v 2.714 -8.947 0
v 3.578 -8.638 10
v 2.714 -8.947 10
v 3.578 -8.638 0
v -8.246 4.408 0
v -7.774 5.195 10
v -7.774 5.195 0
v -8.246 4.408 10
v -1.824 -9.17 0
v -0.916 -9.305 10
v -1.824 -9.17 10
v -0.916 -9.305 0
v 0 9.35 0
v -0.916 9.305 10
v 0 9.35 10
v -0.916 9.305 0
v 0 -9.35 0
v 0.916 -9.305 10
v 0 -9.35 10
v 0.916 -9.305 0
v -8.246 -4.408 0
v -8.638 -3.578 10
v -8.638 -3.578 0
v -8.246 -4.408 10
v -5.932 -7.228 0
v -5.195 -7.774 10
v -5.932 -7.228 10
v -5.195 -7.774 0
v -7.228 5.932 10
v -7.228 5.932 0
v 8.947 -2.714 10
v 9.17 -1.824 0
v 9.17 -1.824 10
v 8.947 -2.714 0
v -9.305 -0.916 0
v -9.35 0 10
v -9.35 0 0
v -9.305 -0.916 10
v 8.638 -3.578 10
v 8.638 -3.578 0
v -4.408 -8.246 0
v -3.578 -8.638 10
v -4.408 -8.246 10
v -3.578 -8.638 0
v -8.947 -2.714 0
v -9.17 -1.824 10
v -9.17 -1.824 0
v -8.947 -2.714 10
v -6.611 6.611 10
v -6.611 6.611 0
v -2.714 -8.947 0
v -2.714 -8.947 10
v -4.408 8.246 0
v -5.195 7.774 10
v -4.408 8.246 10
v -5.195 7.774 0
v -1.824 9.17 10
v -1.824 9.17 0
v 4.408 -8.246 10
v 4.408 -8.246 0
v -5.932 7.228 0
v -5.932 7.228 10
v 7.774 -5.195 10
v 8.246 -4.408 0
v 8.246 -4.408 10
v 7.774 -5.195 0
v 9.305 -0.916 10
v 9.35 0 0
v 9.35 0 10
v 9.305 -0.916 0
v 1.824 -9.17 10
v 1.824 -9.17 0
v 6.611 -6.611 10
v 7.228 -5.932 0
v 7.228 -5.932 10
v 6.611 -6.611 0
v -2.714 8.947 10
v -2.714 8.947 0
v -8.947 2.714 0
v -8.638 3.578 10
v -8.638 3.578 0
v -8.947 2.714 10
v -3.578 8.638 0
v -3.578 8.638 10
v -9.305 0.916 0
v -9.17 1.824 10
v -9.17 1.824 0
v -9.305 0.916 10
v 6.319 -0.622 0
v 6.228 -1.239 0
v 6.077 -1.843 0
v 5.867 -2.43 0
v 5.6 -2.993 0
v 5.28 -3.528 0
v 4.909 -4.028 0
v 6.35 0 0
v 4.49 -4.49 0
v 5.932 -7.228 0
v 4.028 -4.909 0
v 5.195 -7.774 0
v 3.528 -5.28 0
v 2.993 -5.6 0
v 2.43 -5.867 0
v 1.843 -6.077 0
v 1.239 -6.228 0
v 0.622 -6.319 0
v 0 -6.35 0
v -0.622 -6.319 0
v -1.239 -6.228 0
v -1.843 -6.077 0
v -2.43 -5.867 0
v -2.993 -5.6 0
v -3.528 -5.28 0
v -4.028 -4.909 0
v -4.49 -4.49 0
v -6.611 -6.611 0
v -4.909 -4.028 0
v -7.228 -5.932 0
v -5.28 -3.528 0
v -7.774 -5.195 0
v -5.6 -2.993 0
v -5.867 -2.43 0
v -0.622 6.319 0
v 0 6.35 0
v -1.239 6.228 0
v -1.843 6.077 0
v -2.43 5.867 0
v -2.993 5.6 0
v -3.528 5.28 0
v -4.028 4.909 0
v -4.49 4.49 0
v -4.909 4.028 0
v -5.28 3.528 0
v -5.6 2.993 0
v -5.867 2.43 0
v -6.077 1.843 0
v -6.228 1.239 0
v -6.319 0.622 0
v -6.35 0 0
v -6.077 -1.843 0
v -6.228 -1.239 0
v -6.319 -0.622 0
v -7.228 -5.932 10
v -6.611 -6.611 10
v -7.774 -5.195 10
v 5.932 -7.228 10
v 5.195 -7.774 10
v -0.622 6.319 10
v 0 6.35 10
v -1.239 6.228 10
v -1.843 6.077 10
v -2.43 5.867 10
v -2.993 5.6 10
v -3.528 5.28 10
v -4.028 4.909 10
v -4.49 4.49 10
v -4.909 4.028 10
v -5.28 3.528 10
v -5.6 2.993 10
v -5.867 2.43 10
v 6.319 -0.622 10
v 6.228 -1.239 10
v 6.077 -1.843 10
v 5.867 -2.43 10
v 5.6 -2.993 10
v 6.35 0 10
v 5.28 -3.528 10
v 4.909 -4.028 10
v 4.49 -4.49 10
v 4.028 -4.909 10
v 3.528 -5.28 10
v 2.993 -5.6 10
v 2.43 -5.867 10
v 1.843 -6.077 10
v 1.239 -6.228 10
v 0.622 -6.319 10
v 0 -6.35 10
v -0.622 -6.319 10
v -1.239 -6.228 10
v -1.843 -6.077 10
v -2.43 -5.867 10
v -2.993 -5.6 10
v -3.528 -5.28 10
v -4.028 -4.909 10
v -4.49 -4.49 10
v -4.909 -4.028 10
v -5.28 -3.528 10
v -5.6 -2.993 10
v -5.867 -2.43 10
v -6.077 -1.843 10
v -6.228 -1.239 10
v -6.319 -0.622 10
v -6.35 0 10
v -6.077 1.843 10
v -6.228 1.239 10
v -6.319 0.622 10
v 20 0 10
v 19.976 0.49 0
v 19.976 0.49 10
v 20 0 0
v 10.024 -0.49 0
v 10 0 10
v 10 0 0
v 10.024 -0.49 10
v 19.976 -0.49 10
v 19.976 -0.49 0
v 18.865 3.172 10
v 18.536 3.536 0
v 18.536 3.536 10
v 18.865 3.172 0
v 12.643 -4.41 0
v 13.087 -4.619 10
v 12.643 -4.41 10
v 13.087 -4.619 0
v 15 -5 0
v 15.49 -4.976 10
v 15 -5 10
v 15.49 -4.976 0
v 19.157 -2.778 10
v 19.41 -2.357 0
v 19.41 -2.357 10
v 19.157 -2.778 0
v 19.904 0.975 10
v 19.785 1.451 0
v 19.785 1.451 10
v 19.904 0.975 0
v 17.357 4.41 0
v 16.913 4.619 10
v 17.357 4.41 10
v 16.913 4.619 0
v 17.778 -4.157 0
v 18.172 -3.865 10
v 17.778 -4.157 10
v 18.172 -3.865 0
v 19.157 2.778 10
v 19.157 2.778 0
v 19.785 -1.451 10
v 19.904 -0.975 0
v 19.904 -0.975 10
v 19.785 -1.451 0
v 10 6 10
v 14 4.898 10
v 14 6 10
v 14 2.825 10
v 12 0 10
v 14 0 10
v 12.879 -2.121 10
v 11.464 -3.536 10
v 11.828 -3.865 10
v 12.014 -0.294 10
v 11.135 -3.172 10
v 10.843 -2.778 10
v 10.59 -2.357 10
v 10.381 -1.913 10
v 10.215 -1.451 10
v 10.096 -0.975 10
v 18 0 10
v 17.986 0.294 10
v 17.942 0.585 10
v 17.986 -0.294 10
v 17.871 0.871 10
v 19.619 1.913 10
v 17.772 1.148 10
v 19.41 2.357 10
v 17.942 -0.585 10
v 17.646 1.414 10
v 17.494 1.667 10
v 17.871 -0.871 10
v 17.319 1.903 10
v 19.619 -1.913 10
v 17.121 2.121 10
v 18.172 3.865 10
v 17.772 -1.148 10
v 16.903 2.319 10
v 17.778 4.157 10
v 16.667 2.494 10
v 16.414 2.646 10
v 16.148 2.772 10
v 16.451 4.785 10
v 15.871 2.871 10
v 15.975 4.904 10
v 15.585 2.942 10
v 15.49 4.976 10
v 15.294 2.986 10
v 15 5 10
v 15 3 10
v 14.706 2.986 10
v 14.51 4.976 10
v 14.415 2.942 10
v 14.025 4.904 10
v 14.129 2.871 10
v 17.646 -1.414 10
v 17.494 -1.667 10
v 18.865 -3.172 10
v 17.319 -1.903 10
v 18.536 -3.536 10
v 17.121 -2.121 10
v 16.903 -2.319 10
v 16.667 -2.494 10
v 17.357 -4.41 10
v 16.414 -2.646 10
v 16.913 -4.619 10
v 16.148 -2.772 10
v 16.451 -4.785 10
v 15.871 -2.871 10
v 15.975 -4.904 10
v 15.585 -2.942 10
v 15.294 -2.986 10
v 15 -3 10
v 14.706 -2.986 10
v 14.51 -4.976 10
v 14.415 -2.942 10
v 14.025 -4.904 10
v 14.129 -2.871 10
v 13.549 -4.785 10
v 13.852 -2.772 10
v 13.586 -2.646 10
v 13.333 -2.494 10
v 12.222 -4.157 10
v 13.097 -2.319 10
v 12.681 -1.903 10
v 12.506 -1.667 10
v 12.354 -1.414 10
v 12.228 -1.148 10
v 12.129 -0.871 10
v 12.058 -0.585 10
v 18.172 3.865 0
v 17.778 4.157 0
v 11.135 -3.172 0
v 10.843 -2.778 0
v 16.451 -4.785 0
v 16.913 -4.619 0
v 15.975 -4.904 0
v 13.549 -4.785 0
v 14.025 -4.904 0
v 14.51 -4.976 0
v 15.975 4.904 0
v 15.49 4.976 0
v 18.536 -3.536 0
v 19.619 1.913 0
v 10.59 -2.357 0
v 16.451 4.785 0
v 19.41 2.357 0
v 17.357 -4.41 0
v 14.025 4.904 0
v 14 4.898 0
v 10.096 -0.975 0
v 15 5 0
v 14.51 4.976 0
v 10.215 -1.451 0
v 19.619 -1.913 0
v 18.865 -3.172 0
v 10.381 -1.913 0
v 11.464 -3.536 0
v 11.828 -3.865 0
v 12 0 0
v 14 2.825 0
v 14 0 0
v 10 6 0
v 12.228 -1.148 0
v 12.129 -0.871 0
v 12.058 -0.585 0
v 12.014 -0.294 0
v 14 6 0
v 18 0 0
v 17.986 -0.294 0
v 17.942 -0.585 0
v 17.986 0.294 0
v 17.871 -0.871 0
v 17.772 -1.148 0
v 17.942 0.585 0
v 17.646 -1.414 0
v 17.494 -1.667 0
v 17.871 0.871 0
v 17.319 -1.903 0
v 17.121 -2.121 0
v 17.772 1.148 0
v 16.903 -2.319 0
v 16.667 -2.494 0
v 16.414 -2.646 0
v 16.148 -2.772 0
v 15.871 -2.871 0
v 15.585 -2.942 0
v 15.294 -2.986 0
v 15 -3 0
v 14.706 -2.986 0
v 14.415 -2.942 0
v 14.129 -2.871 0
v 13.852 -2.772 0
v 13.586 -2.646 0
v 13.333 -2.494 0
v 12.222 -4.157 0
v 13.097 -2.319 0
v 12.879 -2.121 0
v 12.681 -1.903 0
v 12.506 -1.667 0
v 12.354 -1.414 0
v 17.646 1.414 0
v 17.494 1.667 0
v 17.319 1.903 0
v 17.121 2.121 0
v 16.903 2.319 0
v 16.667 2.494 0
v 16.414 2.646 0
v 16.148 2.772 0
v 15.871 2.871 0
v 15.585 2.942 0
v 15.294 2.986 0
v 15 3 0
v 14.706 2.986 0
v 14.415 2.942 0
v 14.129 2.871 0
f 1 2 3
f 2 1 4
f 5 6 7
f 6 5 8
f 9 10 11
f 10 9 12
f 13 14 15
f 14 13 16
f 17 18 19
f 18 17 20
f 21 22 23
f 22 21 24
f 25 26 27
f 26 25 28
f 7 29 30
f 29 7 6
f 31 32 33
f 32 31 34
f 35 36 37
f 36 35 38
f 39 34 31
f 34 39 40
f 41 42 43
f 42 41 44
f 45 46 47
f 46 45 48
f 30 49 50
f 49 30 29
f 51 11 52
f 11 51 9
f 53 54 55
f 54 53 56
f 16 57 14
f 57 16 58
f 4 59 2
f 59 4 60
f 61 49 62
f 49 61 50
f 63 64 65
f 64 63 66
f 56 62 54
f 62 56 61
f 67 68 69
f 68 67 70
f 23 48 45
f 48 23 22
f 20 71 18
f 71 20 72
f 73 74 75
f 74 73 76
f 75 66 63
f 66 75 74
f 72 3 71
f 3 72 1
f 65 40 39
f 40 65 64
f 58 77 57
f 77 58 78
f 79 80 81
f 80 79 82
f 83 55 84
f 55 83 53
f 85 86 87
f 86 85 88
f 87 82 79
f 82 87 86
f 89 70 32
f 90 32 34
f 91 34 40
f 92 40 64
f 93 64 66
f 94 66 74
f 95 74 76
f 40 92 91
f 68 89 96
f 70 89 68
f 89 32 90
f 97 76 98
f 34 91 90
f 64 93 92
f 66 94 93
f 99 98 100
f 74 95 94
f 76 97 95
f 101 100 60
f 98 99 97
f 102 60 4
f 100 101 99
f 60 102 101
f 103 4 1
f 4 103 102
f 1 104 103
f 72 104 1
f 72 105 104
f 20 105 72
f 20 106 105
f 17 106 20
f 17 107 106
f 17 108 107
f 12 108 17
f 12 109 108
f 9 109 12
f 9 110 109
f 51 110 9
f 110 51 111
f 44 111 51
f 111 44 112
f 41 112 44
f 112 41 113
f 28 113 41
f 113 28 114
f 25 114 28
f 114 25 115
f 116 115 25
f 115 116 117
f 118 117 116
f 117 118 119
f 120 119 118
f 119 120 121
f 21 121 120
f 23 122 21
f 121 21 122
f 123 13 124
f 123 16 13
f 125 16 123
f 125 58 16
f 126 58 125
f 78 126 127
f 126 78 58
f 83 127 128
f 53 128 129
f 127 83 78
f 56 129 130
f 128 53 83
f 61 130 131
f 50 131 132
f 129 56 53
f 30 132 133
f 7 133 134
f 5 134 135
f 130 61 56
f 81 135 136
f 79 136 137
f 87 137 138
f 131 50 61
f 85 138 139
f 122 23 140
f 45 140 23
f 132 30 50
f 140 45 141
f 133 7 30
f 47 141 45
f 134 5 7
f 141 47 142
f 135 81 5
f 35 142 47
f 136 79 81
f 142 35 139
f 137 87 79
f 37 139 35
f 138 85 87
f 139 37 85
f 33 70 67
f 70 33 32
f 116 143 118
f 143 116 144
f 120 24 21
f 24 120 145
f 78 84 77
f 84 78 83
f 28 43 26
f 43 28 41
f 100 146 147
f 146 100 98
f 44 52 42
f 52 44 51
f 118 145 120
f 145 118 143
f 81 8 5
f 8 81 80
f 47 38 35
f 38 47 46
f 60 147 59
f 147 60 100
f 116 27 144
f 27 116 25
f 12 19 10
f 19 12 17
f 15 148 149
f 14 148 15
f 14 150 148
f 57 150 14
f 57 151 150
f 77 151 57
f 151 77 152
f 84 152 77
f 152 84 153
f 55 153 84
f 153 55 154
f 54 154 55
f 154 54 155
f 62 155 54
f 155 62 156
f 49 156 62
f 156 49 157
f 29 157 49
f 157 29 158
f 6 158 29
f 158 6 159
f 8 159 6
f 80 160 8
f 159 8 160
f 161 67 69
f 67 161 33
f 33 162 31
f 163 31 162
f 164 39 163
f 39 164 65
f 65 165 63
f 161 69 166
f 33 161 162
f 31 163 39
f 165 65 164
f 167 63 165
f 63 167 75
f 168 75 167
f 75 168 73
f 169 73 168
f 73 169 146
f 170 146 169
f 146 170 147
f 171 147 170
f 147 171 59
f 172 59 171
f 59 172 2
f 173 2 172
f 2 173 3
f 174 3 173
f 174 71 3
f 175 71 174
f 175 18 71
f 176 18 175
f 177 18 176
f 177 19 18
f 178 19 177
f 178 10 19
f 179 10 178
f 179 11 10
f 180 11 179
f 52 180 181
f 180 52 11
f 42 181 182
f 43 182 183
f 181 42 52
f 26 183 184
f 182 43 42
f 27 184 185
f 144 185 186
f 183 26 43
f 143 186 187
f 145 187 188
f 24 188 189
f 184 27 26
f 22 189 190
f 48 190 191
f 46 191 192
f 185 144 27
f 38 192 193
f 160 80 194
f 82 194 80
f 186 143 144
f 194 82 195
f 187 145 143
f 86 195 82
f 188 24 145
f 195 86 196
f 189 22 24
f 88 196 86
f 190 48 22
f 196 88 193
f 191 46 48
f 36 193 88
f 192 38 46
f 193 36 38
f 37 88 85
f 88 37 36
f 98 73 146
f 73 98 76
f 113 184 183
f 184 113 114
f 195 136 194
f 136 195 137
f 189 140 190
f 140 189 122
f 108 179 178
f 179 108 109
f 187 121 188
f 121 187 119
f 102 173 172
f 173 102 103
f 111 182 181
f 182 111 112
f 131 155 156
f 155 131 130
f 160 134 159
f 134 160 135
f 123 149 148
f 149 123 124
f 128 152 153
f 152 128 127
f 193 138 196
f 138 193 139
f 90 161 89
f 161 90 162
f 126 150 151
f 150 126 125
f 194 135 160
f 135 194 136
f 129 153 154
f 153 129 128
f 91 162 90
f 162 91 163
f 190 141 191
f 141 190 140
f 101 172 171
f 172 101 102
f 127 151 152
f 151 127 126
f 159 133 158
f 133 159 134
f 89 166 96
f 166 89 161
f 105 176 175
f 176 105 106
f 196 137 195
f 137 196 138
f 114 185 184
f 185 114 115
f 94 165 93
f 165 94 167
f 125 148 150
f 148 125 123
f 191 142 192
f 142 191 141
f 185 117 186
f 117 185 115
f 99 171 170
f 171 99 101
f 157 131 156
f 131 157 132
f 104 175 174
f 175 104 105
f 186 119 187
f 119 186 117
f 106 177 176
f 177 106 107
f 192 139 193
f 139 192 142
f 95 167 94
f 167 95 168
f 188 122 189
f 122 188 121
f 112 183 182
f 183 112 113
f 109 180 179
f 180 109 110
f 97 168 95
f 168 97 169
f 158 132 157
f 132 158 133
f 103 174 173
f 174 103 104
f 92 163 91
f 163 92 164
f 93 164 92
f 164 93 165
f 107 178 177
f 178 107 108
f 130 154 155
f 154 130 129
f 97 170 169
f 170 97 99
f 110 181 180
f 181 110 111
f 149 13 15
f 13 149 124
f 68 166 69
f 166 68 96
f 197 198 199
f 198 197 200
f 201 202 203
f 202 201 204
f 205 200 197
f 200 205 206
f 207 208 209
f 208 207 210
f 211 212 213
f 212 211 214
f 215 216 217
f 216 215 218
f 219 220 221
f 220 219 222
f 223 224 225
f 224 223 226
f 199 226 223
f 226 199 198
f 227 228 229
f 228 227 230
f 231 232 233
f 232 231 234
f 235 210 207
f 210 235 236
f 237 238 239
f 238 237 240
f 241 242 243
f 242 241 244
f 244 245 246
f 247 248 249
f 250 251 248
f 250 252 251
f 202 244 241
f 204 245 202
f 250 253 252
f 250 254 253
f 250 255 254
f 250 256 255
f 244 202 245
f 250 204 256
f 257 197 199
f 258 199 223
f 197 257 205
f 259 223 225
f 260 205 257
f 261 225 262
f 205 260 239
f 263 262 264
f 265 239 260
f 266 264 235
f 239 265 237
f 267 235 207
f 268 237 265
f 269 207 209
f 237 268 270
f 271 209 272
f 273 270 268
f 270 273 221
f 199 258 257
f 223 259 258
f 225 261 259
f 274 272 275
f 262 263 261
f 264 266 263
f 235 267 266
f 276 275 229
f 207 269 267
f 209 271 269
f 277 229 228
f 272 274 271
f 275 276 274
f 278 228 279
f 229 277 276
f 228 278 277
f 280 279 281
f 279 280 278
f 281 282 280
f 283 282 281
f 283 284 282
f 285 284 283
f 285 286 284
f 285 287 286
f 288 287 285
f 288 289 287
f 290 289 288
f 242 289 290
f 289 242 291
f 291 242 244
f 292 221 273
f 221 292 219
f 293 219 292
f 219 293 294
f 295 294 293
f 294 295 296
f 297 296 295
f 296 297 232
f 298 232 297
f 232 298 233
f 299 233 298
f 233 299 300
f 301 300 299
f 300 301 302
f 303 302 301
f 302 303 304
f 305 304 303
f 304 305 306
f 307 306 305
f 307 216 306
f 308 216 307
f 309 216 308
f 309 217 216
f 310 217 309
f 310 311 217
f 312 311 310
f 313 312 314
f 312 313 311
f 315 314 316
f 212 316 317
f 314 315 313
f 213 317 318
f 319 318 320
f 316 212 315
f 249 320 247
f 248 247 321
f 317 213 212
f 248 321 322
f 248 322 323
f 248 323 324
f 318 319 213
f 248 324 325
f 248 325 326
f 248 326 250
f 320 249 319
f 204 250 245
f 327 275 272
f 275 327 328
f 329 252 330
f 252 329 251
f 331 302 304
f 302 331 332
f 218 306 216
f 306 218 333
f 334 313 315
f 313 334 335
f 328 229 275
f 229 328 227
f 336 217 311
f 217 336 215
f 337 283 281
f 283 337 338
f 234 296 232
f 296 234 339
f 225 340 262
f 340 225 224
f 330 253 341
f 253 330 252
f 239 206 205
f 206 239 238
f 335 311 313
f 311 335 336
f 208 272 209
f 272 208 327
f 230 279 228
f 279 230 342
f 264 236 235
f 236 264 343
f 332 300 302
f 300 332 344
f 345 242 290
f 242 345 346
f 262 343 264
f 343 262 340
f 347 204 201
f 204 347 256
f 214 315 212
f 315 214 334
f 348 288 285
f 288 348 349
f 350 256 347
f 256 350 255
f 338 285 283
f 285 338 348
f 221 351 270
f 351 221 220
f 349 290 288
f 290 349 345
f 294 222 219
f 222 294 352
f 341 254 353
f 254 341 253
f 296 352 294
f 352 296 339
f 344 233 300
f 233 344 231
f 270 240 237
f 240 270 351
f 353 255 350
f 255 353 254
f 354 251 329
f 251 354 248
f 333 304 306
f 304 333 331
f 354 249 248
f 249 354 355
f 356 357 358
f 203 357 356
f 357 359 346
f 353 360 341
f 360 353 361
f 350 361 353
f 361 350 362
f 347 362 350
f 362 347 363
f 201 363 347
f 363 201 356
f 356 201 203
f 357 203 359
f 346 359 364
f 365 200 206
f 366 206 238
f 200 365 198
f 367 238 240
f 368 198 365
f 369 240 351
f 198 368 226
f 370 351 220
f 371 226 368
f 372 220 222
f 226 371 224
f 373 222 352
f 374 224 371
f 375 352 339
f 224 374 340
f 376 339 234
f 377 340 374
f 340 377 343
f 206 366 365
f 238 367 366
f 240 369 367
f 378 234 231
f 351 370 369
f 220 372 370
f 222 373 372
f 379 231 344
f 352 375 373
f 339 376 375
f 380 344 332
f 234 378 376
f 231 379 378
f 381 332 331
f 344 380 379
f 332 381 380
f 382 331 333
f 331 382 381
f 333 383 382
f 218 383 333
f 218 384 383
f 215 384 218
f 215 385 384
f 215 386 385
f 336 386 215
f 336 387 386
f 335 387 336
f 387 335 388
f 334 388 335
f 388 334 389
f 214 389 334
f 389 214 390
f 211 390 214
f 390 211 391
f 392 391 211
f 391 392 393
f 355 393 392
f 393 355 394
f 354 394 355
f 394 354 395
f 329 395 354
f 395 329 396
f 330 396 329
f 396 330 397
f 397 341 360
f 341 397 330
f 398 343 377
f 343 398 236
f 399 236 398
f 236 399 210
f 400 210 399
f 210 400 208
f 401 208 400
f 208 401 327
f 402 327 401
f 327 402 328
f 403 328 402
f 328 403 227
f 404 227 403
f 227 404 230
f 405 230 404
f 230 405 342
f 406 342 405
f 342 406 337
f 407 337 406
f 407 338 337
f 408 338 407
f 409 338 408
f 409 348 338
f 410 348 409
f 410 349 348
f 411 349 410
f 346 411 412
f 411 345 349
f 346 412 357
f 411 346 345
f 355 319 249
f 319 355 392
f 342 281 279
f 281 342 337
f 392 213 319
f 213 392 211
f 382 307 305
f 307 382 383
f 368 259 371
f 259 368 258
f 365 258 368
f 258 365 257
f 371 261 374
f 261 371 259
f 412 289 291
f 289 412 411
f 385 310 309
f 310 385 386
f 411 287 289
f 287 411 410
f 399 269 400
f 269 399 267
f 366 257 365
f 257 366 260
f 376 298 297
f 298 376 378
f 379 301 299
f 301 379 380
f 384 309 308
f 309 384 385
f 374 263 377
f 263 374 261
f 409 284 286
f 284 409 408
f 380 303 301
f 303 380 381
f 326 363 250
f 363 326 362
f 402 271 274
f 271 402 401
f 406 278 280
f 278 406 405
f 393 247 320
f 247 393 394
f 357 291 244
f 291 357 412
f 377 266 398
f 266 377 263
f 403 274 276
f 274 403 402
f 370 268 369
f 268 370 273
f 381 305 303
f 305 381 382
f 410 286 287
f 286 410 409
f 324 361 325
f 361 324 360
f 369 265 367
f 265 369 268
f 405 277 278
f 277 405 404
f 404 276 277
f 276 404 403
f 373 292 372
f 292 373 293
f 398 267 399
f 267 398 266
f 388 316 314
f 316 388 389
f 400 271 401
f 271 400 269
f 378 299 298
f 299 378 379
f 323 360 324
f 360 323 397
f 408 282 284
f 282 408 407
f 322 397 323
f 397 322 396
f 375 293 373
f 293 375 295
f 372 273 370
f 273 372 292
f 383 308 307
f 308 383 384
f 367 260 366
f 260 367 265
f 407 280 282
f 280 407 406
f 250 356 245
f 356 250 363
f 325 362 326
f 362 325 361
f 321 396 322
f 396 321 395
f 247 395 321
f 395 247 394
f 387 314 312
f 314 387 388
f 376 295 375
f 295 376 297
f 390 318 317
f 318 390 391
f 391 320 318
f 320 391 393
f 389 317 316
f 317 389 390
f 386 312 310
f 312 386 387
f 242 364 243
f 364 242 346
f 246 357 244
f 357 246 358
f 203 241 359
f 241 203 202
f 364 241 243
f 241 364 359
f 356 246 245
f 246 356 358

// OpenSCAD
$fn = 64;

// Dimensions
rod_diameter = 12.7;           // Inner diameter of rod ring
rod_wall = 3;                 // Wall thickness of rod ring
rod_outer_diameter = rod_diameter + 2 * rod_wall; // 18.7 mm

tubing_inner_diameter = 6;     // Inner diameter of tubing ring
tubing_wall = 2;               // Wall thickness of tubing ring
tubing_outer_diameter = tubing_inner_diameter + 2 * tubing_wall; // 10 mm

bridge_width_y = 6;          // Width of bridge in Y direction
bridge_start_x = 8;            // Start X of bridge
bridge_end_x = 12;           // End X of bridge

// Rod ring: centered at origin, with -X side opening
rod_ring_inner_radius = rod_diameter / 2;
rod_ring_outer_radius = rod_outer_diameter / 2;

// Tubing ring: centered at (15, 0), with +X side opening
tubing_ring_center_x = 15;
tubing_ring_center_y = 0;
tubing_ring_inner_radius = tubing_inner_diameter / 2;
tubing_ring_outer_radius = tubing_outer_diameter / 2;

// Opening dimensions
rod_opening_width = 10;        // -5 < y < 5 → height 10 mm
tubing_opening_width = 4.5; // -2.25 < y < 2.25 → height 4.5 mm

// Bridge: solid connection between rings
bridge_y_min = -bridge_width_y / 2;
bridge_y_max = bridge_width_y / 2;

// The issue: the rod ring's outer shape is not a perfect circle in the slice at z=0.5,
// but the report shows "shape 18.70 x 18.70" (a square) instead of a circle.
// This indicates that the rod ring is not being properly modeled as a circular ring.
// The problem: using `cylinder` with `center = false` and `h = 10` creates a cylinder from z=0 to z=10,
// but the `difference` operation is applied to the full height, and the hole is also from z=0 to z=10.01,
// but the opening is a cube that extends from z=-0.01 to z=10.02 — this causes the hole to be too deep,
// and the slicing engine interprets the intersection as a rectangular profile.

// The real issue: the `cylinder` with `center = false` is correct for z=0 to z=10,
// but the `difference` with the cube (which extends 0.01 below z=0) causes the hole to be cut through the entire base,
// and the slicing algorithm sees the intersection of the cylinder and the cube as a rectangular profile at z=0.5,
// because the cube is not aligned to the cylinder's center.

// Fix: ensure the opening cutout (cube) is aligned to the rod ring's center and only cuts through the ring at the correct z.
// Also, the rod ring's outer shape should be a perfect circle, not a square.

// Correct approach: use `cylinder` with `center = false` for both the outer ring and the hole,
// and make the opening cutout (cube) only extend from z=0 to z=10.01, not below.

// Also, the tubing ring's opening is cut with a cube that extends below z=0 — this is wrong.

// Revised: define the clip with all geometry in z = 0 to 10, and ensure all cuts are within bounds.

module clip() {
    // Rod ring: centered at origin, with -X side opening
    difference() {
        // Outer ring (rod ring) - from z=0 to z=10
        cylinder(r = rod_ring_outer_radius, h = 10, center = false);
        
        // Inner hole (rod ring)
        cylinder(r = rod_ring_inner_radius, h = 10.01, center = false);
        
        // Cut out rod ring opening: rectangle from x = -inf to x = 0, y = -5 to 5, z = 0 to 10.01
        // Must extend slightly beyond in z to ensure clean cut
        translate([0, 0, -0.01])
            cube([rod_ring_outer_radius * 2, rod_opening_width, 10.02], center = false);
    }

    // Tubing ring: centered at (15, 0), with +X side opening
    difference() {
        // Outer tubing ring
        translate([tubing_ring_center_x, tubing_ring_center_y, 0])
            cylinder(r = tubing_ring_outer_radius, h = 10, center = false);
        
        // Inner hole of tubing ring
        translate([tubing_ring_center_x, tubing_ring_center_y, 0])
            cylinder(r = tubing_ring_inner_radius, h = 10.01, center = false);
        
        // Cut out tubing ring opening: rectangle from x = 15 to x = 15 + 4.5, y = -2.25 to 2.25, z = 0 to 10.01
        translate([tubing_ring_center_x + tubing_ring_outer_radius, 0, -0.01])
            cube([tubing_opening_width + 0.1, tubing_opening_width, 10.02], center = false);
    }

    // Add bridge between rings
    // Bridge is a solid rectangle from x = 8 to 12, y = -3 to 3, z = 0 to 10
    translate([bridge_start_x + (bridge_end_x - bridge_start_x)/2, 0, 0])
        cube([bridge_end_x - bridge_start_x, bridge_width_y, 10], center = false);
}

// Render the clip with correct z alignment and proper cuts
clip();
